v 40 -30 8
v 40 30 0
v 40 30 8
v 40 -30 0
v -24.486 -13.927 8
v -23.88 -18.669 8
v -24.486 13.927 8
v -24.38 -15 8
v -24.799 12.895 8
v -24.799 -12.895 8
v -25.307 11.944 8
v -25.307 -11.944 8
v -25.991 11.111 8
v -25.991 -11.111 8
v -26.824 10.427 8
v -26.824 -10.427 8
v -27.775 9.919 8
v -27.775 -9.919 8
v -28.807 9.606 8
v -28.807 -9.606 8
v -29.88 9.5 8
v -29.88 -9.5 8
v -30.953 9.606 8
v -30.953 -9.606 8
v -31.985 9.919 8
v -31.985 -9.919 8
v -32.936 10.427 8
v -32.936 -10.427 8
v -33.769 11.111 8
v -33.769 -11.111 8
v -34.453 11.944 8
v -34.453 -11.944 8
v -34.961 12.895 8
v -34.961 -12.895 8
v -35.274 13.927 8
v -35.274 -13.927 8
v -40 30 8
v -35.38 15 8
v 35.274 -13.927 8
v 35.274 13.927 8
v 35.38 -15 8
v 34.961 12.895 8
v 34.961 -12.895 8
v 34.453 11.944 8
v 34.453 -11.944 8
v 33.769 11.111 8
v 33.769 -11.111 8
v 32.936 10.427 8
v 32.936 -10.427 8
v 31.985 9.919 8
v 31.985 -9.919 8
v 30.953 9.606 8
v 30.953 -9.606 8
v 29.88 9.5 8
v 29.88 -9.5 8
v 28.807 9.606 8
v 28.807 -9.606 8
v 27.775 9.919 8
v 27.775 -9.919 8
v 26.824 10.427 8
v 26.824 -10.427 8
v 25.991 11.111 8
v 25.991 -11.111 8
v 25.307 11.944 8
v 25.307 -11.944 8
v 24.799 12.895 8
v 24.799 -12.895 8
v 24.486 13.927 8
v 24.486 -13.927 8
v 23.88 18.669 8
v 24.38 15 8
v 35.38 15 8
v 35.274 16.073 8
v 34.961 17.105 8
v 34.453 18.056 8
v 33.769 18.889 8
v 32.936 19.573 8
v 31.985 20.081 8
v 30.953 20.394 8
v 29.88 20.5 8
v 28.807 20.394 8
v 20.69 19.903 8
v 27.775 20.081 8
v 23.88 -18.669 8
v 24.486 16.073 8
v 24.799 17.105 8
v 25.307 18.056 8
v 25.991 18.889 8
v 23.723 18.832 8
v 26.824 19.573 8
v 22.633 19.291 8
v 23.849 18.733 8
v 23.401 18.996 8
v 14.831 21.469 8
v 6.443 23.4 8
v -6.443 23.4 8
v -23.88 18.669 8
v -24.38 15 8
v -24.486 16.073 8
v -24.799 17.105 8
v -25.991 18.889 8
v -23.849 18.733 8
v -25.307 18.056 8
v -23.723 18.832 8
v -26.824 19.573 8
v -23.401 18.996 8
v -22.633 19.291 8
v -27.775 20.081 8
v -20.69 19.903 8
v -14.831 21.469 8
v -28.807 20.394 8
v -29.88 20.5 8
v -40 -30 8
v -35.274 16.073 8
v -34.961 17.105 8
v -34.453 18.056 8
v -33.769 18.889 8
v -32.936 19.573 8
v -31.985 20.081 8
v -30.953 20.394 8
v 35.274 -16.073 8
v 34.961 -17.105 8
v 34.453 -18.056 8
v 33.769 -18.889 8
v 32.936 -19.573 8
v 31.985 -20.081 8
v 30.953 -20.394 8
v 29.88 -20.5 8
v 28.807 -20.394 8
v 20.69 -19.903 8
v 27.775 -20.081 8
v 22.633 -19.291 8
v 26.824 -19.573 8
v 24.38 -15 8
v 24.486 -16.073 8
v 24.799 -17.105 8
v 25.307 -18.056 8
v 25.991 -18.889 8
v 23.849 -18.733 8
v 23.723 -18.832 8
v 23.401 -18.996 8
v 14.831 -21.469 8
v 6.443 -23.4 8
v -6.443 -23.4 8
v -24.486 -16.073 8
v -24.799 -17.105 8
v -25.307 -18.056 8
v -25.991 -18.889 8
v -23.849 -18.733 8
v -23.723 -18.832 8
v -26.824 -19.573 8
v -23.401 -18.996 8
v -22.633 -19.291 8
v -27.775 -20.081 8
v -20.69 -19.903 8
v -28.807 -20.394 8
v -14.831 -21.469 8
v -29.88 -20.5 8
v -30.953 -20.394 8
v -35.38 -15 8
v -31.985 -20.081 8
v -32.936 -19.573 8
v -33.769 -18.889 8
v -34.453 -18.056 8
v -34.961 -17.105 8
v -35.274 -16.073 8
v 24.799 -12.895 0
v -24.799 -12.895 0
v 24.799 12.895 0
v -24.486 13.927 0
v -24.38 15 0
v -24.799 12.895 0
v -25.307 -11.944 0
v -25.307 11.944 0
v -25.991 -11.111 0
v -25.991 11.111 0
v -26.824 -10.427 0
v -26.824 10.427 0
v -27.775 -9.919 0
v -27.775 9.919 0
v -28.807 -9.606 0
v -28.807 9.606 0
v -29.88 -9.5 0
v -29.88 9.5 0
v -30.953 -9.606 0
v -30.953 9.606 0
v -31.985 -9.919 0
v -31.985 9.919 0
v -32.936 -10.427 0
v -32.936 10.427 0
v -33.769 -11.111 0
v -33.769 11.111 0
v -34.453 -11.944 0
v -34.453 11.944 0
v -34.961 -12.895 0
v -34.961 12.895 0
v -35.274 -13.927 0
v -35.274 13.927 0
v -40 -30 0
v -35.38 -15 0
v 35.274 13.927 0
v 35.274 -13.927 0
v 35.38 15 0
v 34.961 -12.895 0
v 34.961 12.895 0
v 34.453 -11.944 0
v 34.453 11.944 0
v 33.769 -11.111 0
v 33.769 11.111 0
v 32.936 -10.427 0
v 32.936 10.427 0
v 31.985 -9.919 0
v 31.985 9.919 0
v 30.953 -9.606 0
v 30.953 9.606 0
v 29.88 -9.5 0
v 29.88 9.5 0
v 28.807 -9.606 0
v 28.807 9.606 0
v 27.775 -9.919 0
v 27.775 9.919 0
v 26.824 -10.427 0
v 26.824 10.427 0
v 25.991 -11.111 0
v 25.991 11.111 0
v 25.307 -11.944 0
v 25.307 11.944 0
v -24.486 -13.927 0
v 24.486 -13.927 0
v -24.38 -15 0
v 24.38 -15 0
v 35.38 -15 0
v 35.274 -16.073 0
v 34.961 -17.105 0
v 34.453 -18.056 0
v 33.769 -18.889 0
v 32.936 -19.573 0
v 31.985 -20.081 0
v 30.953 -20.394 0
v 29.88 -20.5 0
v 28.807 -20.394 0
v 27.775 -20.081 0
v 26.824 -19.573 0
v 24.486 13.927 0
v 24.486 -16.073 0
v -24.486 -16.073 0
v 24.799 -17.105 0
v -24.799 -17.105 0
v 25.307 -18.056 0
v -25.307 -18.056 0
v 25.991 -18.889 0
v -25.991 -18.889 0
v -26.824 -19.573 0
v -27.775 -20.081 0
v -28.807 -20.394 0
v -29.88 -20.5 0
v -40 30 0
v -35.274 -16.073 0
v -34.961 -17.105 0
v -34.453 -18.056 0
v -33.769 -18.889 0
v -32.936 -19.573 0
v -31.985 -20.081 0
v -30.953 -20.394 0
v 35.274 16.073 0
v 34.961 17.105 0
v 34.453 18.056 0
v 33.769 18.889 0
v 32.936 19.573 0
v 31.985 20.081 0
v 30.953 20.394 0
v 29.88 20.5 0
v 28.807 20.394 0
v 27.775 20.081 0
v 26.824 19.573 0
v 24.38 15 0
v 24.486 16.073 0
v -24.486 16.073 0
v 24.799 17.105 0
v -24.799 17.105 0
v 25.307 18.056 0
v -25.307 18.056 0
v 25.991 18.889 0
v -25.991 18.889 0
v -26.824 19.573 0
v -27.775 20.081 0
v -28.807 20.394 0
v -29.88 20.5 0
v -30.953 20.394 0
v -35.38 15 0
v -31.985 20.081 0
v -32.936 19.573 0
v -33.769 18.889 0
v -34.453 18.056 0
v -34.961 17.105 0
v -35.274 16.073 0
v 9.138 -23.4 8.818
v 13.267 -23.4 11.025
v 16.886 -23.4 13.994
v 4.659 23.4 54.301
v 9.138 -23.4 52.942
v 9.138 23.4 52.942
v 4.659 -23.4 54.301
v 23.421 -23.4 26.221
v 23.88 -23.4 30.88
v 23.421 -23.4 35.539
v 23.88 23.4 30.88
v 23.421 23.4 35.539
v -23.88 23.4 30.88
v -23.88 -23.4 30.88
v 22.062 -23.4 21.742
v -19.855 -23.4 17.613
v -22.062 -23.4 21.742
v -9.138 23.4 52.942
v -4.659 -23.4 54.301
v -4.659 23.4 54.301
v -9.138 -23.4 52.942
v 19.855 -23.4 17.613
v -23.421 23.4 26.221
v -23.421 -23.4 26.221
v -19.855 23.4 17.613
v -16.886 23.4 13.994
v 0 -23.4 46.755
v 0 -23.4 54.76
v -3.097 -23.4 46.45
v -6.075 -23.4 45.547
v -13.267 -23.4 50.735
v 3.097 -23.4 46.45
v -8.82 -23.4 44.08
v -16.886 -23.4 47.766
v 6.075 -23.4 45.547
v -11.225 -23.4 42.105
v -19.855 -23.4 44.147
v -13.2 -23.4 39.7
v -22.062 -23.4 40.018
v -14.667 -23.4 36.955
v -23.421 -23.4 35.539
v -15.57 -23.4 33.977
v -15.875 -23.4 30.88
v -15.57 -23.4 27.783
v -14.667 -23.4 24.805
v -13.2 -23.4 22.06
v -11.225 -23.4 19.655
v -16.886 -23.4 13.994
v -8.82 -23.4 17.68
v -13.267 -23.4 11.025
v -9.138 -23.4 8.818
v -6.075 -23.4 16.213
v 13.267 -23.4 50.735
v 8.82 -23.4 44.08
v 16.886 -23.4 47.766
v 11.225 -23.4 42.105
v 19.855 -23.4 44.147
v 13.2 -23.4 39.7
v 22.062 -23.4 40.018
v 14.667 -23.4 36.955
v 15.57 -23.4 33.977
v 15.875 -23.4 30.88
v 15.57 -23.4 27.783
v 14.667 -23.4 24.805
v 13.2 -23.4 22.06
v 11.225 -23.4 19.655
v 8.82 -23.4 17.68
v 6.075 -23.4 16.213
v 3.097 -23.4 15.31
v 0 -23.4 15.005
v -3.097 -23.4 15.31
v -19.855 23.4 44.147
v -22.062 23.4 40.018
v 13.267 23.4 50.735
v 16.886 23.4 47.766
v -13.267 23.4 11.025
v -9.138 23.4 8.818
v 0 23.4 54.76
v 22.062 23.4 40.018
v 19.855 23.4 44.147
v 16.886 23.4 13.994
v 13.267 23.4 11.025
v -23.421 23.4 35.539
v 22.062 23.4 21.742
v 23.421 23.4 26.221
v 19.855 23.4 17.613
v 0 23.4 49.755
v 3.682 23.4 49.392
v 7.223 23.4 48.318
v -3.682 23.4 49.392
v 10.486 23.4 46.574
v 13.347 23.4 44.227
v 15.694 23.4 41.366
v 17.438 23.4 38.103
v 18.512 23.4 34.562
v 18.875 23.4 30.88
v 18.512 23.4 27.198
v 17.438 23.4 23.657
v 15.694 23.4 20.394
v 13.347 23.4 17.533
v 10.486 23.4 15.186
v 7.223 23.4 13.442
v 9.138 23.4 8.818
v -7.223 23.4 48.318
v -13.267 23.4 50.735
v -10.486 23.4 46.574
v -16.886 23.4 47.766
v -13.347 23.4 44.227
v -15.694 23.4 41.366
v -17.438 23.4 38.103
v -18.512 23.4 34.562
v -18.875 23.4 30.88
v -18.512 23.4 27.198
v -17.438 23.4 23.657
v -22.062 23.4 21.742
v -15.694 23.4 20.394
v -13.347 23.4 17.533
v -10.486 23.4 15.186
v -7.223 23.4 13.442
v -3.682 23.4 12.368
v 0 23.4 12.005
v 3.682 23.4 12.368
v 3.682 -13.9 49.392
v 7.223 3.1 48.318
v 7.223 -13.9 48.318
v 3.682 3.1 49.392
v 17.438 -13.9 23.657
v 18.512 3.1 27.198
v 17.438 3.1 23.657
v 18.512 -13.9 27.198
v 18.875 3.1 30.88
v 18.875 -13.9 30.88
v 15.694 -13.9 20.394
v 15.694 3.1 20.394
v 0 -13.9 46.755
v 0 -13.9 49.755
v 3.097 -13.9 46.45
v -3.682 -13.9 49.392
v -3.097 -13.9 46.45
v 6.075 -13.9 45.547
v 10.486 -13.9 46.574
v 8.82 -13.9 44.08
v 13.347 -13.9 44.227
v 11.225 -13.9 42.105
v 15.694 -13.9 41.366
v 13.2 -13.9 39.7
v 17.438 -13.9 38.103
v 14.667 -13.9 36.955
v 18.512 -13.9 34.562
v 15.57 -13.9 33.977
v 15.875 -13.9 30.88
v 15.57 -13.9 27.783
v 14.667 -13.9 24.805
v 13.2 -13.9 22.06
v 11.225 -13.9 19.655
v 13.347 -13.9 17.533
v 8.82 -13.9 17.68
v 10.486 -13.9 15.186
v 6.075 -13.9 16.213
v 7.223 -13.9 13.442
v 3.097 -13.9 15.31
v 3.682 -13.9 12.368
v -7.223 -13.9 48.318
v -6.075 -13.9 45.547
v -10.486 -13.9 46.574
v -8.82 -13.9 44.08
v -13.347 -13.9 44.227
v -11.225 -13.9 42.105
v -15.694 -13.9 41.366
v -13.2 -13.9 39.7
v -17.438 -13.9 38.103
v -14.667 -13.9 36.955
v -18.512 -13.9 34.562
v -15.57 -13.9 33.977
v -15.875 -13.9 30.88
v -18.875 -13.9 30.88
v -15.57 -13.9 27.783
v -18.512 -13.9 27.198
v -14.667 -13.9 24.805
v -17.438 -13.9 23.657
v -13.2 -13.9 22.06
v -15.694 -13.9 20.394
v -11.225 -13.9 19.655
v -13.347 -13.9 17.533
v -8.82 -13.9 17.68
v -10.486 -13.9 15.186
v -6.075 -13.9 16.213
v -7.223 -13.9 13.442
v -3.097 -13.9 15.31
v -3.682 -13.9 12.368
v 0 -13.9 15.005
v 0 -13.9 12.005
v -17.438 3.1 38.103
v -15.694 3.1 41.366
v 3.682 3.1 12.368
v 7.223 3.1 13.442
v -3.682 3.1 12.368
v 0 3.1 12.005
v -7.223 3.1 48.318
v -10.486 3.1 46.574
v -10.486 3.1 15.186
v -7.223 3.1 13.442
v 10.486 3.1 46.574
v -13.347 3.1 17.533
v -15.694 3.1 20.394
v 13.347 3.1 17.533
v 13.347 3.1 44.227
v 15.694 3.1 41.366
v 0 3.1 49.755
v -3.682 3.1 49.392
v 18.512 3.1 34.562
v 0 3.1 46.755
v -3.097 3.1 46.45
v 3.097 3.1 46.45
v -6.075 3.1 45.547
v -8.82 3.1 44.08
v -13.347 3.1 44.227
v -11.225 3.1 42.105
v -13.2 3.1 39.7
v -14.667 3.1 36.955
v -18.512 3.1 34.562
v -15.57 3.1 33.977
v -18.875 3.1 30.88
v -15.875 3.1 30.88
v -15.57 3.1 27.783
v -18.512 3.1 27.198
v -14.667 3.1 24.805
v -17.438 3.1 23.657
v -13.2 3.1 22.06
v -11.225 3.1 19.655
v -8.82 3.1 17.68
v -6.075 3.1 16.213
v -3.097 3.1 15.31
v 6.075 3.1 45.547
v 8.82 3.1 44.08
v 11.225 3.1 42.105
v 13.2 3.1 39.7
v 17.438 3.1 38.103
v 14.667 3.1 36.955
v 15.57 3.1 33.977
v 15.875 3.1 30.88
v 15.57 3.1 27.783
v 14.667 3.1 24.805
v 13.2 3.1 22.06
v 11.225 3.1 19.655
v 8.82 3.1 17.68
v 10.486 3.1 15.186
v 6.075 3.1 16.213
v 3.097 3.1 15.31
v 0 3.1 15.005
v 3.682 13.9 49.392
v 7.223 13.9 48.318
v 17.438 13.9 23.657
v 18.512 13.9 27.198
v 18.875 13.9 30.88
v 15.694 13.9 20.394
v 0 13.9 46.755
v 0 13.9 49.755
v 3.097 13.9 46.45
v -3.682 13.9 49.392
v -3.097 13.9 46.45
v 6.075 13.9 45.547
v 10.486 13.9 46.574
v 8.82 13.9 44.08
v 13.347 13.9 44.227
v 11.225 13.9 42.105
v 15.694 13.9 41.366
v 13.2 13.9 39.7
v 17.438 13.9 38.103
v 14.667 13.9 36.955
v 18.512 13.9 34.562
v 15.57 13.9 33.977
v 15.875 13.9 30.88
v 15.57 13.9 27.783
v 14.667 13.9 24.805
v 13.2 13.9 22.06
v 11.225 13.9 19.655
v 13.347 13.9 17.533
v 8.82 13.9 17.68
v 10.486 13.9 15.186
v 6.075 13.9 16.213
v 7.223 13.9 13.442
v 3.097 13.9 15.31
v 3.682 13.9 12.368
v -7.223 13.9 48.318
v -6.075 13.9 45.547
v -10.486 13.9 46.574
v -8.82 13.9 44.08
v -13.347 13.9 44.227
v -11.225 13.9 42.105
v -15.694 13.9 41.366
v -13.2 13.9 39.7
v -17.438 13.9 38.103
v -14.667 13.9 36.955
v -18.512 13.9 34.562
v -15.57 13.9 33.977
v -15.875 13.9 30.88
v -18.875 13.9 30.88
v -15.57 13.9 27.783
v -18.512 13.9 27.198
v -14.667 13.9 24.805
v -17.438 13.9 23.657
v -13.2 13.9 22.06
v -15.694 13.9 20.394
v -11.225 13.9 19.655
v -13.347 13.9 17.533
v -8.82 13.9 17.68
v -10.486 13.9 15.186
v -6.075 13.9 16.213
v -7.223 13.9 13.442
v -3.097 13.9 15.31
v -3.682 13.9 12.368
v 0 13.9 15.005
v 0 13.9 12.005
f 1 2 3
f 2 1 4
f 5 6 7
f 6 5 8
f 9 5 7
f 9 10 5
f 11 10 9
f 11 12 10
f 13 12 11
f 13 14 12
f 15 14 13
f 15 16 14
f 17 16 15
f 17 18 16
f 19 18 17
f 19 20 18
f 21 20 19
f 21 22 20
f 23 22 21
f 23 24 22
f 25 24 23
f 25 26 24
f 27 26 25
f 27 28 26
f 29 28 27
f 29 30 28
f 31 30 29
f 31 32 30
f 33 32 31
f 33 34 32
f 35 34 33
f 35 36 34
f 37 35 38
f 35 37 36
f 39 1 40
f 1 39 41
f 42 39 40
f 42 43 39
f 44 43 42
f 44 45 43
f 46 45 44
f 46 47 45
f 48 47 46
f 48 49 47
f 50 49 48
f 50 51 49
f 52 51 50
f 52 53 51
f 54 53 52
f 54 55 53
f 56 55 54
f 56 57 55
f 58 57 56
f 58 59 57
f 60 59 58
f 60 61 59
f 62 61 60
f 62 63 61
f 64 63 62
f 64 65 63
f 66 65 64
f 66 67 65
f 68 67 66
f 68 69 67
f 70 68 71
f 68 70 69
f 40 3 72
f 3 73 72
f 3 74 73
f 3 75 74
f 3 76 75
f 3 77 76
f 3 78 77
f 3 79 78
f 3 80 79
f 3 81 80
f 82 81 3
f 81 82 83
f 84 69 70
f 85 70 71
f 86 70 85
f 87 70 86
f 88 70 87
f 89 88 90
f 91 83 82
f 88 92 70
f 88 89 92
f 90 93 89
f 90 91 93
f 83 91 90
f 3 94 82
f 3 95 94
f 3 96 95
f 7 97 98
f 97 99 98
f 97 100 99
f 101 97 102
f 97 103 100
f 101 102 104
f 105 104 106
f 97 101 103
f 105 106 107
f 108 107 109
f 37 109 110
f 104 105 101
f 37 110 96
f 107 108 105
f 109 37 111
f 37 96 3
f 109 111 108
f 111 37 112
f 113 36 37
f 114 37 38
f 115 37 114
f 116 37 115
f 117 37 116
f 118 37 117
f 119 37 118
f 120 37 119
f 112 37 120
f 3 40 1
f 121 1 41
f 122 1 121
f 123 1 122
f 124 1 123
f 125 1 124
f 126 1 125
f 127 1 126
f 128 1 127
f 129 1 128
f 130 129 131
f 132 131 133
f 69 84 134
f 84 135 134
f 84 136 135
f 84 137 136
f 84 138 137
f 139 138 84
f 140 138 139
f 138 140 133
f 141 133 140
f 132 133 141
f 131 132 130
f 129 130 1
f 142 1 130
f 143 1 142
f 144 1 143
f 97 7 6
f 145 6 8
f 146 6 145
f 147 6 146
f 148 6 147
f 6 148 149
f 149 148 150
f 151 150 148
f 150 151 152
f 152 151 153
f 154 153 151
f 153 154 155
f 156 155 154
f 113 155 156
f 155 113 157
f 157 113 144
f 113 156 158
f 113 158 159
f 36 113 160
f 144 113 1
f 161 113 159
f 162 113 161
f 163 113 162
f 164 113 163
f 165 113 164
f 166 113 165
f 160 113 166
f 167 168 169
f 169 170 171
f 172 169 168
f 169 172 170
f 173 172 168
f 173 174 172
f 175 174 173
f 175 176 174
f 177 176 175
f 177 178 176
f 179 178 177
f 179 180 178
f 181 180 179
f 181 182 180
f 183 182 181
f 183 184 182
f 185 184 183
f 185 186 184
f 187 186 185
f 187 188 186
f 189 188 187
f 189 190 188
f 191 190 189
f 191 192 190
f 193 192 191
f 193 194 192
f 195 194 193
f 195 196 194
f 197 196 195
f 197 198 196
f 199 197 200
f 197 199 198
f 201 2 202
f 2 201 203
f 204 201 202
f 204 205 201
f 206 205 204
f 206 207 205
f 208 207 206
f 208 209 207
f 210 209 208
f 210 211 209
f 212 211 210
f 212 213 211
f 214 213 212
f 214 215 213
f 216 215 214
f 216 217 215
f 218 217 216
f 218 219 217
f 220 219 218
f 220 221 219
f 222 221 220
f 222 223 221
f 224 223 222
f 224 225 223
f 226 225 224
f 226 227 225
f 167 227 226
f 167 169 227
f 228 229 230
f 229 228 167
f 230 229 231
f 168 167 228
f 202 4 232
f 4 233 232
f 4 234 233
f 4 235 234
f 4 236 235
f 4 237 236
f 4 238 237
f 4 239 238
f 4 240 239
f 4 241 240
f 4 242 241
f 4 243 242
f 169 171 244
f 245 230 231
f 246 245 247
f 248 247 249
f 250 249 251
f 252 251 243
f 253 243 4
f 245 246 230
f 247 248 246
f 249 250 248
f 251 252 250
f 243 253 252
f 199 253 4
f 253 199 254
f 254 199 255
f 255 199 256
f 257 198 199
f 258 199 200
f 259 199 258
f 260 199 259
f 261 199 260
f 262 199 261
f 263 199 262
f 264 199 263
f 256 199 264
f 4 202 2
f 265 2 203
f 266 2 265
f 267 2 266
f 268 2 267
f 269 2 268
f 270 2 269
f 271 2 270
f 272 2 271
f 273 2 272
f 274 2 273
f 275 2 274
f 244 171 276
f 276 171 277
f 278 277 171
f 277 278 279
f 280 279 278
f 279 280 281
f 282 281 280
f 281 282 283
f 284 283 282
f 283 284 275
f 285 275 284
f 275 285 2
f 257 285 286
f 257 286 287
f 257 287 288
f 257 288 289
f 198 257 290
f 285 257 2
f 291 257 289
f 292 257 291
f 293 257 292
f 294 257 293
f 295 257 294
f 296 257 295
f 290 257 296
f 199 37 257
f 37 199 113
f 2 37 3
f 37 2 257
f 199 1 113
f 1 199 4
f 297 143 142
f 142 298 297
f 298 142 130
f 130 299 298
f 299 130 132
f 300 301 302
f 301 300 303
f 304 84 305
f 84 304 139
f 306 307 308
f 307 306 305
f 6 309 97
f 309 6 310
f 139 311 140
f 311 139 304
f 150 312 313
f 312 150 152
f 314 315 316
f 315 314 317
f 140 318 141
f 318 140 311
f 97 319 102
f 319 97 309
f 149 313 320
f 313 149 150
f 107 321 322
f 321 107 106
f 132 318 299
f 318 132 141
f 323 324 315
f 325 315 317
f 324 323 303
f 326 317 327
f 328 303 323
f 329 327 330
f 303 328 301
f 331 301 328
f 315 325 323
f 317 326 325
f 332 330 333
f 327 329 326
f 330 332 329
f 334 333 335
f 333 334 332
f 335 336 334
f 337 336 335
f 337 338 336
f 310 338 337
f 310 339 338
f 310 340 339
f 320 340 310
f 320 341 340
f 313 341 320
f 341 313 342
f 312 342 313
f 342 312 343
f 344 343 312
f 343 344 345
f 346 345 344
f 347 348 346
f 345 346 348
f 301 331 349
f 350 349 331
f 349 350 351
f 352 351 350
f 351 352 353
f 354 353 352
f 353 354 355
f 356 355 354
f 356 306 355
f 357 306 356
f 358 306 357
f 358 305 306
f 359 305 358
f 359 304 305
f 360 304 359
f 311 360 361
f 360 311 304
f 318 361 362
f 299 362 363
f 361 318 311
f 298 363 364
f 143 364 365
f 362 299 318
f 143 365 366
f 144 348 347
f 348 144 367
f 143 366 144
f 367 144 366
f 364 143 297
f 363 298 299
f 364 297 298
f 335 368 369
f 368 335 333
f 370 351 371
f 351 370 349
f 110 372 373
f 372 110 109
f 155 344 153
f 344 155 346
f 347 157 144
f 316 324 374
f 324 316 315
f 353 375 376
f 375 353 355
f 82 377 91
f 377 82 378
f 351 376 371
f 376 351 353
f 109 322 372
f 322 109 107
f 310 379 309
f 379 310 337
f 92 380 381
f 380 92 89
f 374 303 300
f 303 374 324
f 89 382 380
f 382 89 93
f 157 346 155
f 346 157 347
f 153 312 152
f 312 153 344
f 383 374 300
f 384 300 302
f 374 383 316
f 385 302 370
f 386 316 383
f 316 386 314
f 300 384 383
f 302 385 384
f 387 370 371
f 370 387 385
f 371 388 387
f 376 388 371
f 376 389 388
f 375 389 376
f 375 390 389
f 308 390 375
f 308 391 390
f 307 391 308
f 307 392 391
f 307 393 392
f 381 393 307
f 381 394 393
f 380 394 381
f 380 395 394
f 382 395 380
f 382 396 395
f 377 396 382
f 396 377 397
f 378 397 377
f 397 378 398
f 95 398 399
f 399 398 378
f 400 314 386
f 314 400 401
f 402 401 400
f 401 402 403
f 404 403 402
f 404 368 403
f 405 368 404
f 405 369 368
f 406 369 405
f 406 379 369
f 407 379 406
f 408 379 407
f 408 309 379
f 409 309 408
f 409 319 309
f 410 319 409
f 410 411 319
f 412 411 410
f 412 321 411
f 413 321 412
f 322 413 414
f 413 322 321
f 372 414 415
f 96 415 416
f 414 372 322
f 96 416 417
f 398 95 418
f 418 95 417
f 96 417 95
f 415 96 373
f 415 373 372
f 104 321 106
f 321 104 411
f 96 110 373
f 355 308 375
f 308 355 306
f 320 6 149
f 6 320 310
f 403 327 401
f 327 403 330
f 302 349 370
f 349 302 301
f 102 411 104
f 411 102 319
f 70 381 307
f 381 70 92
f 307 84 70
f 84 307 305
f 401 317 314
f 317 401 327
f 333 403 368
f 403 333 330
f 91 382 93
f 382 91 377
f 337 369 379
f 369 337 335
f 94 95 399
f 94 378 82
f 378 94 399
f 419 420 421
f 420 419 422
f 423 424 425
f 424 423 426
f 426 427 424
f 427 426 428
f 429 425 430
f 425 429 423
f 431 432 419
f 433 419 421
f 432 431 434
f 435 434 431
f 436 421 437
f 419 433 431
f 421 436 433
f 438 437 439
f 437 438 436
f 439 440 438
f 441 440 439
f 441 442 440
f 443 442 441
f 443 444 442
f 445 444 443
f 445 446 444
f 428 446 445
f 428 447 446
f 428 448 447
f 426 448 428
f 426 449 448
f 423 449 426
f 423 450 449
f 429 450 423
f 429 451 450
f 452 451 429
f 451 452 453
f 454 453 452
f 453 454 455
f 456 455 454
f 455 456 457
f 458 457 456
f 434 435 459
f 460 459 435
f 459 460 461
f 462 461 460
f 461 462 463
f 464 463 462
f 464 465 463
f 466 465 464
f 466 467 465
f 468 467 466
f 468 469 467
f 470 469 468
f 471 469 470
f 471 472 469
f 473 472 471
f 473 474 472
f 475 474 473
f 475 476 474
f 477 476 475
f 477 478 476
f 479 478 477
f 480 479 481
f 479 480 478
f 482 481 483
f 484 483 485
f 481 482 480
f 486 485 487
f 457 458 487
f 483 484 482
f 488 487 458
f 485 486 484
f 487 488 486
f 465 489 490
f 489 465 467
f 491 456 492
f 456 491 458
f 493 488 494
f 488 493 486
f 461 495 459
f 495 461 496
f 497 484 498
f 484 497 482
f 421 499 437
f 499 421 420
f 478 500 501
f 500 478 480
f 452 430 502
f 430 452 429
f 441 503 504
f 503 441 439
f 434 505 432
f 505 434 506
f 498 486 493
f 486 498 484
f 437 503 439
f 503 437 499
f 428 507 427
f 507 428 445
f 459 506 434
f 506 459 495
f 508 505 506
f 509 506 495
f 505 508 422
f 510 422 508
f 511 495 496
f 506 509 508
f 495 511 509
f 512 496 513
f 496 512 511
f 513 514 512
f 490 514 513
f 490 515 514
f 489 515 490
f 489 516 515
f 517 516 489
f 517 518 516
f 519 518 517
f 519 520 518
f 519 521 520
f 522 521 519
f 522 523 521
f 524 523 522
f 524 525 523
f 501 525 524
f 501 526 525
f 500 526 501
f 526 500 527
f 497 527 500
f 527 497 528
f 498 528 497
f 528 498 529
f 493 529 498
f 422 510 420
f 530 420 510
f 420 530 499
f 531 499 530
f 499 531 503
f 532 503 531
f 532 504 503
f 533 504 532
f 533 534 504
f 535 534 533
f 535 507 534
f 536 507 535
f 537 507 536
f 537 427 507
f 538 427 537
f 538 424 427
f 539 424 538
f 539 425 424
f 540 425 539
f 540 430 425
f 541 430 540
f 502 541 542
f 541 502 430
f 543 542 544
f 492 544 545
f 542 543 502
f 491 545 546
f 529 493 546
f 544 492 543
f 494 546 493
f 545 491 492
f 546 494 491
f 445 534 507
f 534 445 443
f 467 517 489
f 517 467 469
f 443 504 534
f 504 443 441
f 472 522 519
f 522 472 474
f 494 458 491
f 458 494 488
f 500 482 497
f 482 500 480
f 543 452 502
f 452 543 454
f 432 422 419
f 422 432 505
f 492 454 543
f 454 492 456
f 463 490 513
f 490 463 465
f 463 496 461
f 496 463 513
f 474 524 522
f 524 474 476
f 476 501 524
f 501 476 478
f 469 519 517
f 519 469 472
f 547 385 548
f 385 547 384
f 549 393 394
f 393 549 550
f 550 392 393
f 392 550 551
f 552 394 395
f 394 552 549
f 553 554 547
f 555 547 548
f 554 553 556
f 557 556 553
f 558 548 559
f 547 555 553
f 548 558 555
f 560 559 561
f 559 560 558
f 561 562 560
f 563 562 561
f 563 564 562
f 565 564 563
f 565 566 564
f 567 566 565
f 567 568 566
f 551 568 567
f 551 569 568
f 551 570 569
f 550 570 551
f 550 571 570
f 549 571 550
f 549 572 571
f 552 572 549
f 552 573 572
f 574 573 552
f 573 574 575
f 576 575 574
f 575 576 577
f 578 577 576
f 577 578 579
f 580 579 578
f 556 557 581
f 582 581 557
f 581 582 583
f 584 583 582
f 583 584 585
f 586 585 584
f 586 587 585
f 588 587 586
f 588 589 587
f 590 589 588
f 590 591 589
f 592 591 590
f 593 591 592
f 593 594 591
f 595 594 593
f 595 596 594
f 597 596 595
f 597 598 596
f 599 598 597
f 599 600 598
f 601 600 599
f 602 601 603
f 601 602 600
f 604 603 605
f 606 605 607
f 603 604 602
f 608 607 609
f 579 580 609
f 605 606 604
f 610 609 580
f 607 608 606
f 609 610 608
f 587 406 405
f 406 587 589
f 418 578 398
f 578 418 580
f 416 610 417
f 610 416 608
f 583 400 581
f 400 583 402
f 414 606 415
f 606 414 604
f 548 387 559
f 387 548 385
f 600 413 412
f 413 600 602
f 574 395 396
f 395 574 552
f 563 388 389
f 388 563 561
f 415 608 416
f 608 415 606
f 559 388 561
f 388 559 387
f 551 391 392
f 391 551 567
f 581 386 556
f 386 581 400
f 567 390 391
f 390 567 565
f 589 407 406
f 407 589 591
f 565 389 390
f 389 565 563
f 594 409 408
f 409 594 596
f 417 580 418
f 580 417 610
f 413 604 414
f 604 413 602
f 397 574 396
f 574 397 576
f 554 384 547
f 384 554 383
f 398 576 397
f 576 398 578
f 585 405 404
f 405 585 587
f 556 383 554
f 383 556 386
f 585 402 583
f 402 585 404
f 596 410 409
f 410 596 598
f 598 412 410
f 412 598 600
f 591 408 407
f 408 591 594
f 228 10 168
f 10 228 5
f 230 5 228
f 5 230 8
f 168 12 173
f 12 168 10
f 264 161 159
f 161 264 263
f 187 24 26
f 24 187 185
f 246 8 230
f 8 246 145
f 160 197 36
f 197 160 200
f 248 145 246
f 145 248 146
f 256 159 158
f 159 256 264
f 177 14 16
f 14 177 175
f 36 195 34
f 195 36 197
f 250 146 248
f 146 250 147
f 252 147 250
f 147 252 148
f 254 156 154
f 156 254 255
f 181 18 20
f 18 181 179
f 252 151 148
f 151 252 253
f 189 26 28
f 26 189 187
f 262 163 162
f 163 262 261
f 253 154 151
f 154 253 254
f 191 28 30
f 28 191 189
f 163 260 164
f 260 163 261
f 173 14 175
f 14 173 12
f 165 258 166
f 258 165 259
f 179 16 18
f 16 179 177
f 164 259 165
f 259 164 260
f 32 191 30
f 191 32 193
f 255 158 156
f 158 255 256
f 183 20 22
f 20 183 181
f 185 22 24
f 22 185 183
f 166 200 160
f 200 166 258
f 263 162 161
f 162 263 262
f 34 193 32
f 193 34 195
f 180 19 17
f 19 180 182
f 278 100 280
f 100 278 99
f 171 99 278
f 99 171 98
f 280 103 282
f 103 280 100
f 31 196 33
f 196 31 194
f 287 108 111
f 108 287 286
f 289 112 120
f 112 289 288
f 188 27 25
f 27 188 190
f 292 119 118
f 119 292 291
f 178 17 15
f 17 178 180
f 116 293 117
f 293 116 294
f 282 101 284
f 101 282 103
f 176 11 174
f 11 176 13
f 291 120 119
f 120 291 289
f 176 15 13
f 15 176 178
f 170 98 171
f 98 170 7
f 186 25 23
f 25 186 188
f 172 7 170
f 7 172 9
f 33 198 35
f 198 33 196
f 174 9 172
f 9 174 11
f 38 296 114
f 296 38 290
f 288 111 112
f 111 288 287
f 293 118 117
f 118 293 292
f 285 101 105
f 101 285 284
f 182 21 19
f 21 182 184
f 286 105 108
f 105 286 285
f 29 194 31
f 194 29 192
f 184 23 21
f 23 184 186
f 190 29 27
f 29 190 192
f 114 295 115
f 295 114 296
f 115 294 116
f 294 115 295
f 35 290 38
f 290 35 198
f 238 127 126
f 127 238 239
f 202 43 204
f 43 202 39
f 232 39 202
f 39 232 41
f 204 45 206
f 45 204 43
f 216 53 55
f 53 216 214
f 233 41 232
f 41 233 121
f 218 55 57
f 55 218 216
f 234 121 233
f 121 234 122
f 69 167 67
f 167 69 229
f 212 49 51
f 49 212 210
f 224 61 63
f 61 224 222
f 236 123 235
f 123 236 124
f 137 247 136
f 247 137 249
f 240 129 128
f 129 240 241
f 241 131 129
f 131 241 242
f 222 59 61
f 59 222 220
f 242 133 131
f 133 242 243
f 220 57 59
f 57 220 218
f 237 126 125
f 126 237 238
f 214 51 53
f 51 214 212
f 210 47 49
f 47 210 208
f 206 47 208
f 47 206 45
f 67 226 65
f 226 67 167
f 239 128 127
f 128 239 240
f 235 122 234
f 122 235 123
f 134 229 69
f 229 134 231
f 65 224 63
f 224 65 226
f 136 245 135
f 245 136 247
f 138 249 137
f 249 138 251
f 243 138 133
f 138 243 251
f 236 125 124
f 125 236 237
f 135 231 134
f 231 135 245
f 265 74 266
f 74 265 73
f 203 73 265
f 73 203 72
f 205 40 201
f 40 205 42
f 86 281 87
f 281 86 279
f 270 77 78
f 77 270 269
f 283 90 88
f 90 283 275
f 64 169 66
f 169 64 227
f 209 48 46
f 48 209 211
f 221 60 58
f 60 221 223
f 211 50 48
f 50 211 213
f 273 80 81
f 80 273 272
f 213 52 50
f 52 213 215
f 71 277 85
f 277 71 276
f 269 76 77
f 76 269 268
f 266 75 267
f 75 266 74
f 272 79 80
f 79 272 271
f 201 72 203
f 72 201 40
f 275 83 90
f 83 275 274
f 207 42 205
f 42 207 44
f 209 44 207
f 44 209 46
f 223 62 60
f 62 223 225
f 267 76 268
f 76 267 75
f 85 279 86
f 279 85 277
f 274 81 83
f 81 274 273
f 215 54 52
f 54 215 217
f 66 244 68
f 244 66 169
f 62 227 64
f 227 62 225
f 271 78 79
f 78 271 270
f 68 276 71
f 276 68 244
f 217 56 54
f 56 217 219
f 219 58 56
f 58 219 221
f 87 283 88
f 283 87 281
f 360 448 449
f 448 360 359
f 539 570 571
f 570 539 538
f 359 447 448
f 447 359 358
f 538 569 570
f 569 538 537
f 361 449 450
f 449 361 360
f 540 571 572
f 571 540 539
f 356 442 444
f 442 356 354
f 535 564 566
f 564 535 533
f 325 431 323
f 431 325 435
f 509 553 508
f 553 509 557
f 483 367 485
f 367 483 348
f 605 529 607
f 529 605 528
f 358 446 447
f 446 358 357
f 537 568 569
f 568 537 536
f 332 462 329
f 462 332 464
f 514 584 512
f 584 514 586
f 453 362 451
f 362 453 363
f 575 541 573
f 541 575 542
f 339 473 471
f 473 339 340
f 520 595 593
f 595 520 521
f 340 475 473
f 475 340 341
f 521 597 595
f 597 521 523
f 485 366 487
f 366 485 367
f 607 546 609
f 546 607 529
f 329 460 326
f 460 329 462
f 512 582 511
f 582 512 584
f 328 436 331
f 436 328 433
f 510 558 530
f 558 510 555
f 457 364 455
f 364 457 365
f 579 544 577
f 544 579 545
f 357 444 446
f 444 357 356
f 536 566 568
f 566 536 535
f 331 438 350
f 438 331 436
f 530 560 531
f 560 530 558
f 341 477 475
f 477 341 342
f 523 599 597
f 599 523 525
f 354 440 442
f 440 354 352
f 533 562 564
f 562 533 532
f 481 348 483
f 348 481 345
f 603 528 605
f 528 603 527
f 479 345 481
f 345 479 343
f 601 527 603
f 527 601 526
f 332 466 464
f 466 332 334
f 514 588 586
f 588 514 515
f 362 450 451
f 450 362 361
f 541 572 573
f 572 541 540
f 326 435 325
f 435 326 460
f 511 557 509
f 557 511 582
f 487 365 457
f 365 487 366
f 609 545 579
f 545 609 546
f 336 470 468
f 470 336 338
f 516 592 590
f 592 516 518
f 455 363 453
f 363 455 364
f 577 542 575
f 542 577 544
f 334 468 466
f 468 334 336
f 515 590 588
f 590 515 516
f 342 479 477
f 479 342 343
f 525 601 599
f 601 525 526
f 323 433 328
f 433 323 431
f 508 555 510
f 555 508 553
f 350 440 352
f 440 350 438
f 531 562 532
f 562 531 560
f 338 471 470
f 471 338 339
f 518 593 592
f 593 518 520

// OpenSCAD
$fn = 32;

// ----------------------------------------------------------------------
// Bearing block: 80 x 60 mm base, 31.75 mm bore at 30.88 mm
// ----------------------------------------------------------------------

// --- parameters (mm) ---
base_w = 80;              // base width
base_d = 60;              // base depth
base_t = 8;               // base thickness
bore_d = 31.75;           // shaft / bearing bore
house_r = 23.88;          // housing outer radius
house_len = 46.8;         // housing length along the shaft
foot_w = 47.76;           // foot width under the housing
foot_len = 36.8;          // foot length along the shaft
axis_z = 30.88;           // bore axis height above the base
holes_d = 11;             // mounting holes
hole_x = 29.88;           // mounting hole spacing
seat_d = 12;              // bearing seat depth
seat_wall = 3;            // seat wall thickness

difference() {
  union() {
    /* base plate with its underside on z = 0 */
    translate([0, 0, base_t / 2]) cube([base_w, base_d, base_t], center = true);
    /* hull foot: a straight web blending into the round housing */
    hull() {
      translate([0, 0, base_t - 0.5]) cube([foot_w, foot_len, 1.6], center = true);
      translate([0, 0, axis_z]) rotate([-90, 0, 0]) cylinder(h = house_len, d = 2 * house_r, center = true);
    }
  }
  /* bore through the housing, 2.5 mm clear on both sides */
  translate([0, 0, axis_z]) rotate([-90, 0, 0]) cylinder(h = house_len + 5, d = bore_d, center = true);
  /* bearing seats, recessed into both ends of the housing */
  for (sy = [-1, 1]) {
    translate([0, sy * (house_len / 2 - seat_d + 2.5), axis_z]) rotate([-90, 0, 0]) cylinder(h = seat_d + 5, d = bore_d + 2 * seat_wall);
  }
  /* mounting holes through the base plate */
  for (hx = [-29.88, 29.88]) {
    for (hy = [-15, 15]) {
      translate([hx, hy, -2.5]) cylinder(h = base_t + 5, d = holes_d);
    }
  }
}
